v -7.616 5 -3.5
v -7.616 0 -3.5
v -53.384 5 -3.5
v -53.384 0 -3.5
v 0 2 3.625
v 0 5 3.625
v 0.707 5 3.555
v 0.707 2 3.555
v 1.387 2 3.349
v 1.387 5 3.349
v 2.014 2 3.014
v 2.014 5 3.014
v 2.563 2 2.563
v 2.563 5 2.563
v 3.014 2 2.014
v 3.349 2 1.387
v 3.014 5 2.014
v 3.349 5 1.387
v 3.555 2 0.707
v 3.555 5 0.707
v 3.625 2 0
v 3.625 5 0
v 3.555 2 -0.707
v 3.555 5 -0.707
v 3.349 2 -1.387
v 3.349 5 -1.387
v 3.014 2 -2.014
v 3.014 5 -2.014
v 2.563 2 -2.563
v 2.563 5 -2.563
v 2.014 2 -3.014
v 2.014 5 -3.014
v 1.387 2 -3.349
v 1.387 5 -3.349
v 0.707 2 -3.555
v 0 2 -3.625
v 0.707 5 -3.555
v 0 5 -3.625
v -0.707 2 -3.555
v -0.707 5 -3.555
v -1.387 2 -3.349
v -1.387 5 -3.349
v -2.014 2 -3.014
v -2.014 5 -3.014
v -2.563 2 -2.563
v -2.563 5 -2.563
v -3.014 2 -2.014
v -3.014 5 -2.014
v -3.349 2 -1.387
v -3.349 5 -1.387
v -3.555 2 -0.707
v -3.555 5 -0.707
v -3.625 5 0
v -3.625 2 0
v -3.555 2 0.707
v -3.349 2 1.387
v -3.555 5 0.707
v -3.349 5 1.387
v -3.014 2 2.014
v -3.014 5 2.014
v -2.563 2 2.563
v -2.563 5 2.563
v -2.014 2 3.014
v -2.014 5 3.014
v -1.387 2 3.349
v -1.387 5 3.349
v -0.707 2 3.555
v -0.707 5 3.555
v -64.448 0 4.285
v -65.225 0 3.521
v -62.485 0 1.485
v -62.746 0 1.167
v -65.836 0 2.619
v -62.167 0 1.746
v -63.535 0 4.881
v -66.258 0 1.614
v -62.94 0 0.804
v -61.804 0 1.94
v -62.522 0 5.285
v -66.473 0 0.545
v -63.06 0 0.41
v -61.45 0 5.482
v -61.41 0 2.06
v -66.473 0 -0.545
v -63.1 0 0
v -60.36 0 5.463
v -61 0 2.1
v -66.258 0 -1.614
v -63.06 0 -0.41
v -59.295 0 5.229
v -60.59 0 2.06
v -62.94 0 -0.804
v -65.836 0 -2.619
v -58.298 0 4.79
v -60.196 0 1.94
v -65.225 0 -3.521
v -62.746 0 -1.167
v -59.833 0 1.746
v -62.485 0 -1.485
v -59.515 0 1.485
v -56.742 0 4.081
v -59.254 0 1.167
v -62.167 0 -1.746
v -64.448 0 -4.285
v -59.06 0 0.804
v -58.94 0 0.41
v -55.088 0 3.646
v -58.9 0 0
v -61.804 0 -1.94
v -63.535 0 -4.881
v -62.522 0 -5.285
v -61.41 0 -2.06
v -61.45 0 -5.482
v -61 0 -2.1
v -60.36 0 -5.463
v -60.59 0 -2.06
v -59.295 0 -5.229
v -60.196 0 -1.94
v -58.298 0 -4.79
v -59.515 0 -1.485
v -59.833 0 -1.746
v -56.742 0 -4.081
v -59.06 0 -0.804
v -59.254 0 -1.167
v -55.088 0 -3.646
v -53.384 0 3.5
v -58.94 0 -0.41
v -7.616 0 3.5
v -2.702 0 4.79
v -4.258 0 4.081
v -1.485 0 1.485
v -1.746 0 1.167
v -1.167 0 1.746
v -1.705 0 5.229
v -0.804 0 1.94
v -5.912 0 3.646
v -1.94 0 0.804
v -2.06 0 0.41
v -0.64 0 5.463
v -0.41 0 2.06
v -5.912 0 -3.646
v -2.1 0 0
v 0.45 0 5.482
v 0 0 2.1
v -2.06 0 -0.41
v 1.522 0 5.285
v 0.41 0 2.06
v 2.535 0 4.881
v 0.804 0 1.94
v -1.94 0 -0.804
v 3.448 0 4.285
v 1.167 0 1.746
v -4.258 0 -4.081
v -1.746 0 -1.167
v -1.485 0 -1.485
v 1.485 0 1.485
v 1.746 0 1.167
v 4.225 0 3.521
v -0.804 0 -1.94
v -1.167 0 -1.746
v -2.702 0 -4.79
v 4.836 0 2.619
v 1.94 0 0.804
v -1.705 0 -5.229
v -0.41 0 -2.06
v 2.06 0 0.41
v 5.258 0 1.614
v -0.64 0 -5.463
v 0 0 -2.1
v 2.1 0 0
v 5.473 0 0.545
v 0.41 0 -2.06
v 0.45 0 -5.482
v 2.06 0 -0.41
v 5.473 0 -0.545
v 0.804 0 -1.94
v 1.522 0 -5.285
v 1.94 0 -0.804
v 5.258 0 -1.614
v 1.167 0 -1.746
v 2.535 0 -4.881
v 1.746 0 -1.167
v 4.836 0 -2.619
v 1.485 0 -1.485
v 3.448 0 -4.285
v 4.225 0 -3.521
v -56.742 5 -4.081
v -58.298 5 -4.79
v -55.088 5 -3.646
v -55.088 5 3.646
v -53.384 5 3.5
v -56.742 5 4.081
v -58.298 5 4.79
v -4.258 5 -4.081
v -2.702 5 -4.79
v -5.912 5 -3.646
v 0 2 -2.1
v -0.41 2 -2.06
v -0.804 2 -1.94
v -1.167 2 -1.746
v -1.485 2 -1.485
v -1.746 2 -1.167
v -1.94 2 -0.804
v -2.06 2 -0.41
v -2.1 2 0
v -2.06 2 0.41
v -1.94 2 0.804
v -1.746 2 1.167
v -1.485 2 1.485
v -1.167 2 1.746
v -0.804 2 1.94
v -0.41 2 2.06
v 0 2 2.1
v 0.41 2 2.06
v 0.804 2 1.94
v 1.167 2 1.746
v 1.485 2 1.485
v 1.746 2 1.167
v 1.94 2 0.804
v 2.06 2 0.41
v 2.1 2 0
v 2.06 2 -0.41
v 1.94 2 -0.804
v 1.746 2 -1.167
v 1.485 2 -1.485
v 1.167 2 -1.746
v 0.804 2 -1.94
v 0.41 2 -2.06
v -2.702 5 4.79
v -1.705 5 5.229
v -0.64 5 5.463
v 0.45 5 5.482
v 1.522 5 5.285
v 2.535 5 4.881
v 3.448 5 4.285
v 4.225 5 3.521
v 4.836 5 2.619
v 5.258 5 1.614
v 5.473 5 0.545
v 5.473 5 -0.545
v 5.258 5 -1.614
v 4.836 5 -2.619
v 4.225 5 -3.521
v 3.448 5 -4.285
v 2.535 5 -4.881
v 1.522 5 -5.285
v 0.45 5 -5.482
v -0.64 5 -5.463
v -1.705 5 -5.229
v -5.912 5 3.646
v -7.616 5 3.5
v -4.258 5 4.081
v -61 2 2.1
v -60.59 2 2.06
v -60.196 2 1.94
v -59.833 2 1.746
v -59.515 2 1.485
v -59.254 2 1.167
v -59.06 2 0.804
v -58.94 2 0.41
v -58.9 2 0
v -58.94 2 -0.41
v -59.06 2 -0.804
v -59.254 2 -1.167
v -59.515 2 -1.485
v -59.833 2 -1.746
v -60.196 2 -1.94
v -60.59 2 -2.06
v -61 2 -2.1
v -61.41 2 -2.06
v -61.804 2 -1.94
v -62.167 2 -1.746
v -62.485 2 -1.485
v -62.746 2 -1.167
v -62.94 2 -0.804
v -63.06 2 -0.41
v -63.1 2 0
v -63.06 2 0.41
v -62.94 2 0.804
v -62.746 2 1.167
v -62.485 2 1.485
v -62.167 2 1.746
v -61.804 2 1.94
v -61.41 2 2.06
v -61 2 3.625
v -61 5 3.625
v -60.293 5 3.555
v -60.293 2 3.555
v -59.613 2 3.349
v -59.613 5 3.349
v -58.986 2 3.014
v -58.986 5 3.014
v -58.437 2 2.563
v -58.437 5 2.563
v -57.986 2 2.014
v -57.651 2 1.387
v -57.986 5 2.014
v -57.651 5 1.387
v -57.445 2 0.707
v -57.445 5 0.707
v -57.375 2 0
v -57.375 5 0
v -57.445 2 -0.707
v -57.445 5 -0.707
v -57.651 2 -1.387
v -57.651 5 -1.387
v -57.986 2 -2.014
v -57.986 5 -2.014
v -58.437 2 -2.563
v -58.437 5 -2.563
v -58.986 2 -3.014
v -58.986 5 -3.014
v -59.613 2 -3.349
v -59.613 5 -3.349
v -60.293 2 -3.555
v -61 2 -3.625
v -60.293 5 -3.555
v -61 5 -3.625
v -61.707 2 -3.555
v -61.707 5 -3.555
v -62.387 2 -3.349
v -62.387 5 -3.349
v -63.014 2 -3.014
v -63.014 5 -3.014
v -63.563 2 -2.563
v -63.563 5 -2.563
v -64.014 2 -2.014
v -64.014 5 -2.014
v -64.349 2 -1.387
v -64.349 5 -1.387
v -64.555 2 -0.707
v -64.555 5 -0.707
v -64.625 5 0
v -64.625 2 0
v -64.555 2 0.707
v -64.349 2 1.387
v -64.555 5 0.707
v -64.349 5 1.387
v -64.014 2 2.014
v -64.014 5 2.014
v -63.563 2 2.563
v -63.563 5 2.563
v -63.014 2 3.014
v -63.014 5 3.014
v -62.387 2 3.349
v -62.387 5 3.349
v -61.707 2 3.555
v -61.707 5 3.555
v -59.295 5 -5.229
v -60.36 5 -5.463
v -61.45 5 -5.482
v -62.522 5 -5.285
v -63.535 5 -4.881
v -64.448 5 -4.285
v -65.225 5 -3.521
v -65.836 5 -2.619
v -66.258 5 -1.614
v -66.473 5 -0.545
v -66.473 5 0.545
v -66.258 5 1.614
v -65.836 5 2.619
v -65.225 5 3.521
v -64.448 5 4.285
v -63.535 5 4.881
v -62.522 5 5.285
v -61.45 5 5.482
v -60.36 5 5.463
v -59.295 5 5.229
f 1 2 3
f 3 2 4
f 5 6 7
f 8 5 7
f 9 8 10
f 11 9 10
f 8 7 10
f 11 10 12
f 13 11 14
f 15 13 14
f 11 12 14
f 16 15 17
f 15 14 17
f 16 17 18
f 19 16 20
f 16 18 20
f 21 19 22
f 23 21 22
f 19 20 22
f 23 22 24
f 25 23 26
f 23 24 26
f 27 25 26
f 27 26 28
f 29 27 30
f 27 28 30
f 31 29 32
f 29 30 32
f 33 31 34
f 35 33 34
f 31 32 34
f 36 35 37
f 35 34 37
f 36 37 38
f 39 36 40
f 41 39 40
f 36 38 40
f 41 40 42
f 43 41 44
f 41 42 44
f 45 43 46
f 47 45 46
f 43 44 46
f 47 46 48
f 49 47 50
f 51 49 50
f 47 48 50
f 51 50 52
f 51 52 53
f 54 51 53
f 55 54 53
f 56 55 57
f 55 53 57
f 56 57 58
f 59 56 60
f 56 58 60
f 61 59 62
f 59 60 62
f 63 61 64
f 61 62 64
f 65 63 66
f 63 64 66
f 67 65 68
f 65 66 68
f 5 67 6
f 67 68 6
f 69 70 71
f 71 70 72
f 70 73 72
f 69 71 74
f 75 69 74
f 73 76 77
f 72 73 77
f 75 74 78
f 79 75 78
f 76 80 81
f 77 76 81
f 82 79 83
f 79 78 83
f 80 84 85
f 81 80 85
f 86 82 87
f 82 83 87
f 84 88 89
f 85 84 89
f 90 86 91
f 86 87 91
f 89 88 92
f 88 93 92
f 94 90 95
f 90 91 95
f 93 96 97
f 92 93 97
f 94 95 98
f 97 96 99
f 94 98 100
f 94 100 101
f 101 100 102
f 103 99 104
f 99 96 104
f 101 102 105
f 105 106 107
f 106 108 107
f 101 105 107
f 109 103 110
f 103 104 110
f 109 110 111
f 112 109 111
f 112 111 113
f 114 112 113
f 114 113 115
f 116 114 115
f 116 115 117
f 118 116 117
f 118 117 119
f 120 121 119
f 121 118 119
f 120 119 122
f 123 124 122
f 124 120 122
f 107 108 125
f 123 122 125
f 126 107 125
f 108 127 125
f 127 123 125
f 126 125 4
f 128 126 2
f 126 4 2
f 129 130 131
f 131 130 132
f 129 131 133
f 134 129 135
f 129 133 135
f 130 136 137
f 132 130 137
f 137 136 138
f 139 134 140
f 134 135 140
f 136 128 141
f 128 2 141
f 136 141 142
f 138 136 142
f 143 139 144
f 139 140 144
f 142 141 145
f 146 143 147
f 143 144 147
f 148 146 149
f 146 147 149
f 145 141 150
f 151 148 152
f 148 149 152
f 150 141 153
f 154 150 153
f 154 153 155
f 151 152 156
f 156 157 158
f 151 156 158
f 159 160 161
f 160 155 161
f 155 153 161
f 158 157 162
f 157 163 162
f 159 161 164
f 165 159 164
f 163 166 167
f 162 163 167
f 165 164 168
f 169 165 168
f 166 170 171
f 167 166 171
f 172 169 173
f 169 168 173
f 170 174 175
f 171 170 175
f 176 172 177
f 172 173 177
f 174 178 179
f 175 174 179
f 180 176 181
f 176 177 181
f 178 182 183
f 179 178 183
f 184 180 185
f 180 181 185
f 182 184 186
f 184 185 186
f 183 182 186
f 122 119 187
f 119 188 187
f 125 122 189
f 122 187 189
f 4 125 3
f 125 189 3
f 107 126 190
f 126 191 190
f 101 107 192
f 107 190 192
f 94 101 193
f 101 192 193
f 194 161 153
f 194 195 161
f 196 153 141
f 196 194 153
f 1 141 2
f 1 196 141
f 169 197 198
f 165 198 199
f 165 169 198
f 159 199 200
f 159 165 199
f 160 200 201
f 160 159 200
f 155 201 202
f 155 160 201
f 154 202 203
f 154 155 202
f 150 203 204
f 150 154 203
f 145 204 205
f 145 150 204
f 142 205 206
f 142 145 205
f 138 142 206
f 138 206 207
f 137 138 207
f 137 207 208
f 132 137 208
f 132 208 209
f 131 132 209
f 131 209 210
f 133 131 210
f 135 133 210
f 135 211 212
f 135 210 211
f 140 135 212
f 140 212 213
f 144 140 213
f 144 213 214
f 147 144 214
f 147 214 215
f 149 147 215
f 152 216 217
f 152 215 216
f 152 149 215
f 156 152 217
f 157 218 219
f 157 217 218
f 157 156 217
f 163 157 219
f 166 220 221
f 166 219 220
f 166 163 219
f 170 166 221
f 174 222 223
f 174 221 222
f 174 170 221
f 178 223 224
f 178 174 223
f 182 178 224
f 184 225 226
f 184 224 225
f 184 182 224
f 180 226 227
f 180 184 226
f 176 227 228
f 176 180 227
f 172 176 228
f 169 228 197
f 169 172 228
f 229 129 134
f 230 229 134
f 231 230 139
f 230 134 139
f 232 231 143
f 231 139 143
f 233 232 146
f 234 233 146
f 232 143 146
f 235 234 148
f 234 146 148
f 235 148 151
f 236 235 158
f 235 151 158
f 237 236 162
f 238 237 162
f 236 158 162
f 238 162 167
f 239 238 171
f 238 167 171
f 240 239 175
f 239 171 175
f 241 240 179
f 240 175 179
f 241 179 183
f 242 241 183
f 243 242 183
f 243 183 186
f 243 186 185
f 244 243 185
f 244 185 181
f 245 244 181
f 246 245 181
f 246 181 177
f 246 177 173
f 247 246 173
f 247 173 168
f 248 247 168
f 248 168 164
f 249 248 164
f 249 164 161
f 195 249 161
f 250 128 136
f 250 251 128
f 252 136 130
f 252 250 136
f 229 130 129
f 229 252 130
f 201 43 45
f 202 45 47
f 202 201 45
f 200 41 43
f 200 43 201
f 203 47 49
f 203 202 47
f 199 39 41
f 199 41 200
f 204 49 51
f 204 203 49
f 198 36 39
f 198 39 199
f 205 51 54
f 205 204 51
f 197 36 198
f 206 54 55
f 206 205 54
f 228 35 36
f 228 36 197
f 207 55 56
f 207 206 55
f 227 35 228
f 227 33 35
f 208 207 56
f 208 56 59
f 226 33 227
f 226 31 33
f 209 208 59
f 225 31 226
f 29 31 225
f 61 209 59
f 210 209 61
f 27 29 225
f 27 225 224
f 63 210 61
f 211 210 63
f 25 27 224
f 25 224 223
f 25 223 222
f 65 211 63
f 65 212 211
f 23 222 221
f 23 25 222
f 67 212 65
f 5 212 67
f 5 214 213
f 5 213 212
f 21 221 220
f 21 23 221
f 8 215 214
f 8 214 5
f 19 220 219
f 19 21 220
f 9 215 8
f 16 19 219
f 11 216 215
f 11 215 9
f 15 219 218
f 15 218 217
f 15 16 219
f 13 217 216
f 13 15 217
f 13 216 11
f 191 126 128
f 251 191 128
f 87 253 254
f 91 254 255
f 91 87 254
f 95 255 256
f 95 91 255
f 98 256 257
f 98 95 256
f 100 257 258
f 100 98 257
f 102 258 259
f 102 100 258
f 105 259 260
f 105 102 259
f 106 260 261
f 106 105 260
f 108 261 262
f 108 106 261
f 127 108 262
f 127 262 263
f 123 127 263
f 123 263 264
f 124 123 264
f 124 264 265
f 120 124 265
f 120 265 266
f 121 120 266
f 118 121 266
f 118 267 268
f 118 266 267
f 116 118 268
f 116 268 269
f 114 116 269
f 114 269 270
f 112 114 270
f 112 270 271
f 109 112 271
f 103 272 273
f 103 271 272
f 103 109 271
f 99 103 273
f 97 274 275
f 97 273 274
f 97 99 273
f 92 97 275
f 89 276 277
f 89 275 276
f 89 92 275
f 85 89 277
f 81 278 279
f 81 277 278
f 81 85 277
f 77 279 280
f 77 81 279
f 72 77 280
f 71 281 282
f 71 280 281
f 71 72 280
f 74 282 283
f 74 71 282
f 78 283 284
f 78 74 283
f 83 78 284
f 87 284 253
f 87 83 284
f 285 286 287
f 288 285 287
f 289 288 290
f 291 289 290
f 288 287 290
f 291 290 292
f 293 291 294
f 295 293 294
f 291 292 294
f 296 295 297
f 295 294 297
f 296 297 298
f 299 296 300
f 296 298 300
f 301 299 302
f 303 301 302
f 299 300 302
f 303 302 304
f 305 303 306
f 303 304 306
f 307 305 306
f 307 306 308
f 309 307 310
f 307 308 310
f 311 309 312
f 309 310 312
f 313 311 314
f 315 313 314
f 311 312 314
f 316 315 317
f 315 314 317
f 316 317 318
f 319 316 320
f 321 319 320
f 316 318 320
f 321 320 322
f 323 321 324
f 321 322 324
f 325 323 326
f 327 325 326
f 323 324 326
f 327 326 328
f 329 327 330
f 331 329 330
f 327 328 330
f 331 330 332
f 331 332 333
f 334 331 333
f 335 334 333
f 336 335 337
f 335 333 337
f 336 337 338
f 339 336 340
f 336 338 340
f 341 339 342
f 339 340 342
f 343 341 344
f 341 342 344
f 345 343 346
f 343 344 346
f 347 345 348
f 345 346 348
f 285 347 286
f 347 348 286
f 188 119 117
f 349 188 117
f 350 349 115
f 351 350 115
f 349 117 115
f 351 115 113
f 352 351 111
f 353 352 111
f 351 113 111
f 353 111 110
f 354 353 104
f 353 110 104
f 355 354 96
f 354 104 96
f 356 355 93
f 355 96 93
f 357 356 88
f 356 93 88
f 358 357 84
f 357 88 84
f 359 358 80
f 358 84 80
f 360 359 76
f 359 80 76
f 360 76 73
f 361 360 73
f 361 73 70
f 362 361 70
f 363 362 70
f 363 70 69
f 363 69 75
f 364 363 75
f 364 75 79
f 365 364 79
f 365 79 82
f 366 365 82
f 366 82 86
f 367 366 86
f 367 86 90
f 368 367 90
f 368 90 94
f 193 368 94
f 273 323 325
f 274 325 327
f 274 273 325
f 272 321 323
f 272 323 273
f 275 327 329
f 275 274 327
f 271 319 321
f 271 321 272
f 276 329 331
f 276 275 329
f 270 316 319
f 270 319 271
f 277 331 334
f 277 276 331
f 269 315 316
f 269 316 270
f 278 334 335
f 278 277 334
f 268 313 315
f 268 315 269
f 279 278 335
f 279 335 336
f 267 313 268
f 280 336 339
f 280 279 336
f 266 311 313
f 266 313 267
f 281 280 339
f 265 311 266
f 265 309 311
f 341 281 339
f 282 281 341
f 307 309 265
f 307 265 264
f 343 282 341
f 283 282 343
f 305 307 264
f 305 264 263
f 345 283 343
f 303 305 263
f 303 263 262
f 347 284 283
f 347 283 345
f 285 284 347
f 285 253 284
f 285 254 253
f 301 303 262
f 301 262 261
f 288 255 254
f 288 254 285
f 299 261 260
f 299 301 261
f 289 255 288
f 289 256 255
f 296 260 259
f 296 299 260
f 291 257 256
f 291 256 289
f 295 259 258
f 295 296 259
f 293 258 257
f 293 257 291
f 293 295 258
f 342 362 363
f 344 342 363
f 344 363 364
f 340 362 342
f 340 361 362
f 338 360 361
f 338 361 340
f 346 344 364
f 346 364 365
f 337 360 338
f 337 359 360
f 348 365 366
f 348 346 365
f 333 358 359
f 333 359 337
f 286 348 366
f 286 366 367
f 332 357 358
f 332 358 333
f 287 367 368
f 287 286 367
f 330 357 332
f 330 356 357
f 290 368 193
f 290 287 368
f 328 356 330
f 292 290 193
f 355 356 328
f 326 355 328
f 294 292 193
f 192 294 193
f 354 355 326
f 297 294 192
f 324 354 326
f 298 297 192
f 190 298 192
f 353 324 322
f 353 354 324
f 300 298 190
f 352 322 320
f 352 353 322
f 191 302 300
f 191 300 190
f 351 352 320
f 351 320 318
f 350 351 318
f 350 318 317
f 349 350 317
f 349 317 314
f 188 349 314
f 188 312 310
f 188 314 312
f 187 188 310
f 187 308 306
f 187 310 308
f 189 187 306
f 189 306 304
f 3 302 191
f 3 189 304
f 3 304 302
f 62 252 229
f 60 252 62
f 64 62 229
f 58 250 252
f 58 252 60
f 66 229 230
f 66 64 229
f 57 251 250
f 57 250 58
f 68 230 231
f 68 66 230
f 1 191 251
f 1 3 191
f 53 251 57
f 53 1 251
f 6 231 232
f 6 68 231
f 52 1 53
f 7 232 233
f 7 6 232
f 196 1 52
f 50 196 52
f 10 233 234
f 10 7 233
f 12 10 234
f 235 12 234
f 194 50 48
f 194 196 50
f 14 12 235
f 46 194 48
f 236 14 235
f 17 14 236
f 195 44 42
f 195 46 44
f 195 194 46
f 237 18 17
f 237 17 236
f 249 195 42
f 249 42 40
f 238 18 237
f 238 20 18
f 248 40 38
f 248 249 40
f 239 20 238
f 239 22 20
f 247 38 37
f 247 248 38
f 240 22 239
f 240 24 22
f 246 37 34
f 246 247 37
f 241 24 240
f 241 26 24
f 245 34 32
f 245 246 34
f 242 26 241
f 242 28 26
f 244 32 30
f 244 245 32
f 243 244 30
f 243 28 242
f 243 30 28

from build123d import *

# Parameters (mm, degrees)
SKETCH1_R           = 2.1
BOSS_EXTRUDE1_DEPTH = 5
SKETCH2_R           = 3.625
CUT_EXTRUDE1_DEPTH  = 3
FILLET1_R           = 10


with BuildPart() as part:
    # Sketch1 → Boss-Extrude1 (new body)
    with BuildSketch(Plane(origin=(0, 0, 0), x_dir=(1, 0, 0), z_dir=(0, 1, 0))):
        with BuildLine():
            Line((-56.757359313, -3.5), (-4.242640687, -3.5))
            ThreePointArc((-4.242640687, -3.5), (5.5, 0), (-4.242640687, 3.5))
            Line((-4.242640687, 3.5), (-56.757359313, 3.5))
            ThreePointArc((-56.757359313, 3.5), (-66.5, 0), (-56.757359313, -3.5))
        make_face()
        with Locations(Location((-61, 0, 0), (0, 0, 270))):
            Circle(SKETCH1_R, mode=Mode.SUBTRACT)
        with Locations(Location((0, 0, 0), (0, 0, 90))):
            Circle(SKETCH1_R, mode=Mode.SUBTRACT)
    extrude(amount=BOSS_EXTRUDE1_DEPTH)

    # Sketch2 → Cut-Extrude1 (cut)
    with BuildSketch(Plane(origin=(0, 5, 0), x_dir=(1, 0, 0), z_dir=(0, 1, 0))):
        with Locations(Location((-61, 0, 0), (0, 0, 270))):
            Circle(SKETCH2_R)
        with Locations(Location((0, 0, 0), (0, 0, 270))):
            Circle(SKETCH2_R)
    extrude(amount=-CUT_EXTRUDE1_DEPTH, mode=Mode.SUBTRACT)

    # Fillet1
    fillet1_edges = [part.edges().sort_by_distance(p)[0] for p in [
        (-4.242640687, 2.5, 3.5),
        (-56.757359313, 2.5, 3.5),
        (-56.757359313, 2.5, -3.5),
        (-4.242640687, 2.5, -3.5),
    ]]
    fillet(fillet1_edges, radius=FILLET1_R)


solid = part.part
